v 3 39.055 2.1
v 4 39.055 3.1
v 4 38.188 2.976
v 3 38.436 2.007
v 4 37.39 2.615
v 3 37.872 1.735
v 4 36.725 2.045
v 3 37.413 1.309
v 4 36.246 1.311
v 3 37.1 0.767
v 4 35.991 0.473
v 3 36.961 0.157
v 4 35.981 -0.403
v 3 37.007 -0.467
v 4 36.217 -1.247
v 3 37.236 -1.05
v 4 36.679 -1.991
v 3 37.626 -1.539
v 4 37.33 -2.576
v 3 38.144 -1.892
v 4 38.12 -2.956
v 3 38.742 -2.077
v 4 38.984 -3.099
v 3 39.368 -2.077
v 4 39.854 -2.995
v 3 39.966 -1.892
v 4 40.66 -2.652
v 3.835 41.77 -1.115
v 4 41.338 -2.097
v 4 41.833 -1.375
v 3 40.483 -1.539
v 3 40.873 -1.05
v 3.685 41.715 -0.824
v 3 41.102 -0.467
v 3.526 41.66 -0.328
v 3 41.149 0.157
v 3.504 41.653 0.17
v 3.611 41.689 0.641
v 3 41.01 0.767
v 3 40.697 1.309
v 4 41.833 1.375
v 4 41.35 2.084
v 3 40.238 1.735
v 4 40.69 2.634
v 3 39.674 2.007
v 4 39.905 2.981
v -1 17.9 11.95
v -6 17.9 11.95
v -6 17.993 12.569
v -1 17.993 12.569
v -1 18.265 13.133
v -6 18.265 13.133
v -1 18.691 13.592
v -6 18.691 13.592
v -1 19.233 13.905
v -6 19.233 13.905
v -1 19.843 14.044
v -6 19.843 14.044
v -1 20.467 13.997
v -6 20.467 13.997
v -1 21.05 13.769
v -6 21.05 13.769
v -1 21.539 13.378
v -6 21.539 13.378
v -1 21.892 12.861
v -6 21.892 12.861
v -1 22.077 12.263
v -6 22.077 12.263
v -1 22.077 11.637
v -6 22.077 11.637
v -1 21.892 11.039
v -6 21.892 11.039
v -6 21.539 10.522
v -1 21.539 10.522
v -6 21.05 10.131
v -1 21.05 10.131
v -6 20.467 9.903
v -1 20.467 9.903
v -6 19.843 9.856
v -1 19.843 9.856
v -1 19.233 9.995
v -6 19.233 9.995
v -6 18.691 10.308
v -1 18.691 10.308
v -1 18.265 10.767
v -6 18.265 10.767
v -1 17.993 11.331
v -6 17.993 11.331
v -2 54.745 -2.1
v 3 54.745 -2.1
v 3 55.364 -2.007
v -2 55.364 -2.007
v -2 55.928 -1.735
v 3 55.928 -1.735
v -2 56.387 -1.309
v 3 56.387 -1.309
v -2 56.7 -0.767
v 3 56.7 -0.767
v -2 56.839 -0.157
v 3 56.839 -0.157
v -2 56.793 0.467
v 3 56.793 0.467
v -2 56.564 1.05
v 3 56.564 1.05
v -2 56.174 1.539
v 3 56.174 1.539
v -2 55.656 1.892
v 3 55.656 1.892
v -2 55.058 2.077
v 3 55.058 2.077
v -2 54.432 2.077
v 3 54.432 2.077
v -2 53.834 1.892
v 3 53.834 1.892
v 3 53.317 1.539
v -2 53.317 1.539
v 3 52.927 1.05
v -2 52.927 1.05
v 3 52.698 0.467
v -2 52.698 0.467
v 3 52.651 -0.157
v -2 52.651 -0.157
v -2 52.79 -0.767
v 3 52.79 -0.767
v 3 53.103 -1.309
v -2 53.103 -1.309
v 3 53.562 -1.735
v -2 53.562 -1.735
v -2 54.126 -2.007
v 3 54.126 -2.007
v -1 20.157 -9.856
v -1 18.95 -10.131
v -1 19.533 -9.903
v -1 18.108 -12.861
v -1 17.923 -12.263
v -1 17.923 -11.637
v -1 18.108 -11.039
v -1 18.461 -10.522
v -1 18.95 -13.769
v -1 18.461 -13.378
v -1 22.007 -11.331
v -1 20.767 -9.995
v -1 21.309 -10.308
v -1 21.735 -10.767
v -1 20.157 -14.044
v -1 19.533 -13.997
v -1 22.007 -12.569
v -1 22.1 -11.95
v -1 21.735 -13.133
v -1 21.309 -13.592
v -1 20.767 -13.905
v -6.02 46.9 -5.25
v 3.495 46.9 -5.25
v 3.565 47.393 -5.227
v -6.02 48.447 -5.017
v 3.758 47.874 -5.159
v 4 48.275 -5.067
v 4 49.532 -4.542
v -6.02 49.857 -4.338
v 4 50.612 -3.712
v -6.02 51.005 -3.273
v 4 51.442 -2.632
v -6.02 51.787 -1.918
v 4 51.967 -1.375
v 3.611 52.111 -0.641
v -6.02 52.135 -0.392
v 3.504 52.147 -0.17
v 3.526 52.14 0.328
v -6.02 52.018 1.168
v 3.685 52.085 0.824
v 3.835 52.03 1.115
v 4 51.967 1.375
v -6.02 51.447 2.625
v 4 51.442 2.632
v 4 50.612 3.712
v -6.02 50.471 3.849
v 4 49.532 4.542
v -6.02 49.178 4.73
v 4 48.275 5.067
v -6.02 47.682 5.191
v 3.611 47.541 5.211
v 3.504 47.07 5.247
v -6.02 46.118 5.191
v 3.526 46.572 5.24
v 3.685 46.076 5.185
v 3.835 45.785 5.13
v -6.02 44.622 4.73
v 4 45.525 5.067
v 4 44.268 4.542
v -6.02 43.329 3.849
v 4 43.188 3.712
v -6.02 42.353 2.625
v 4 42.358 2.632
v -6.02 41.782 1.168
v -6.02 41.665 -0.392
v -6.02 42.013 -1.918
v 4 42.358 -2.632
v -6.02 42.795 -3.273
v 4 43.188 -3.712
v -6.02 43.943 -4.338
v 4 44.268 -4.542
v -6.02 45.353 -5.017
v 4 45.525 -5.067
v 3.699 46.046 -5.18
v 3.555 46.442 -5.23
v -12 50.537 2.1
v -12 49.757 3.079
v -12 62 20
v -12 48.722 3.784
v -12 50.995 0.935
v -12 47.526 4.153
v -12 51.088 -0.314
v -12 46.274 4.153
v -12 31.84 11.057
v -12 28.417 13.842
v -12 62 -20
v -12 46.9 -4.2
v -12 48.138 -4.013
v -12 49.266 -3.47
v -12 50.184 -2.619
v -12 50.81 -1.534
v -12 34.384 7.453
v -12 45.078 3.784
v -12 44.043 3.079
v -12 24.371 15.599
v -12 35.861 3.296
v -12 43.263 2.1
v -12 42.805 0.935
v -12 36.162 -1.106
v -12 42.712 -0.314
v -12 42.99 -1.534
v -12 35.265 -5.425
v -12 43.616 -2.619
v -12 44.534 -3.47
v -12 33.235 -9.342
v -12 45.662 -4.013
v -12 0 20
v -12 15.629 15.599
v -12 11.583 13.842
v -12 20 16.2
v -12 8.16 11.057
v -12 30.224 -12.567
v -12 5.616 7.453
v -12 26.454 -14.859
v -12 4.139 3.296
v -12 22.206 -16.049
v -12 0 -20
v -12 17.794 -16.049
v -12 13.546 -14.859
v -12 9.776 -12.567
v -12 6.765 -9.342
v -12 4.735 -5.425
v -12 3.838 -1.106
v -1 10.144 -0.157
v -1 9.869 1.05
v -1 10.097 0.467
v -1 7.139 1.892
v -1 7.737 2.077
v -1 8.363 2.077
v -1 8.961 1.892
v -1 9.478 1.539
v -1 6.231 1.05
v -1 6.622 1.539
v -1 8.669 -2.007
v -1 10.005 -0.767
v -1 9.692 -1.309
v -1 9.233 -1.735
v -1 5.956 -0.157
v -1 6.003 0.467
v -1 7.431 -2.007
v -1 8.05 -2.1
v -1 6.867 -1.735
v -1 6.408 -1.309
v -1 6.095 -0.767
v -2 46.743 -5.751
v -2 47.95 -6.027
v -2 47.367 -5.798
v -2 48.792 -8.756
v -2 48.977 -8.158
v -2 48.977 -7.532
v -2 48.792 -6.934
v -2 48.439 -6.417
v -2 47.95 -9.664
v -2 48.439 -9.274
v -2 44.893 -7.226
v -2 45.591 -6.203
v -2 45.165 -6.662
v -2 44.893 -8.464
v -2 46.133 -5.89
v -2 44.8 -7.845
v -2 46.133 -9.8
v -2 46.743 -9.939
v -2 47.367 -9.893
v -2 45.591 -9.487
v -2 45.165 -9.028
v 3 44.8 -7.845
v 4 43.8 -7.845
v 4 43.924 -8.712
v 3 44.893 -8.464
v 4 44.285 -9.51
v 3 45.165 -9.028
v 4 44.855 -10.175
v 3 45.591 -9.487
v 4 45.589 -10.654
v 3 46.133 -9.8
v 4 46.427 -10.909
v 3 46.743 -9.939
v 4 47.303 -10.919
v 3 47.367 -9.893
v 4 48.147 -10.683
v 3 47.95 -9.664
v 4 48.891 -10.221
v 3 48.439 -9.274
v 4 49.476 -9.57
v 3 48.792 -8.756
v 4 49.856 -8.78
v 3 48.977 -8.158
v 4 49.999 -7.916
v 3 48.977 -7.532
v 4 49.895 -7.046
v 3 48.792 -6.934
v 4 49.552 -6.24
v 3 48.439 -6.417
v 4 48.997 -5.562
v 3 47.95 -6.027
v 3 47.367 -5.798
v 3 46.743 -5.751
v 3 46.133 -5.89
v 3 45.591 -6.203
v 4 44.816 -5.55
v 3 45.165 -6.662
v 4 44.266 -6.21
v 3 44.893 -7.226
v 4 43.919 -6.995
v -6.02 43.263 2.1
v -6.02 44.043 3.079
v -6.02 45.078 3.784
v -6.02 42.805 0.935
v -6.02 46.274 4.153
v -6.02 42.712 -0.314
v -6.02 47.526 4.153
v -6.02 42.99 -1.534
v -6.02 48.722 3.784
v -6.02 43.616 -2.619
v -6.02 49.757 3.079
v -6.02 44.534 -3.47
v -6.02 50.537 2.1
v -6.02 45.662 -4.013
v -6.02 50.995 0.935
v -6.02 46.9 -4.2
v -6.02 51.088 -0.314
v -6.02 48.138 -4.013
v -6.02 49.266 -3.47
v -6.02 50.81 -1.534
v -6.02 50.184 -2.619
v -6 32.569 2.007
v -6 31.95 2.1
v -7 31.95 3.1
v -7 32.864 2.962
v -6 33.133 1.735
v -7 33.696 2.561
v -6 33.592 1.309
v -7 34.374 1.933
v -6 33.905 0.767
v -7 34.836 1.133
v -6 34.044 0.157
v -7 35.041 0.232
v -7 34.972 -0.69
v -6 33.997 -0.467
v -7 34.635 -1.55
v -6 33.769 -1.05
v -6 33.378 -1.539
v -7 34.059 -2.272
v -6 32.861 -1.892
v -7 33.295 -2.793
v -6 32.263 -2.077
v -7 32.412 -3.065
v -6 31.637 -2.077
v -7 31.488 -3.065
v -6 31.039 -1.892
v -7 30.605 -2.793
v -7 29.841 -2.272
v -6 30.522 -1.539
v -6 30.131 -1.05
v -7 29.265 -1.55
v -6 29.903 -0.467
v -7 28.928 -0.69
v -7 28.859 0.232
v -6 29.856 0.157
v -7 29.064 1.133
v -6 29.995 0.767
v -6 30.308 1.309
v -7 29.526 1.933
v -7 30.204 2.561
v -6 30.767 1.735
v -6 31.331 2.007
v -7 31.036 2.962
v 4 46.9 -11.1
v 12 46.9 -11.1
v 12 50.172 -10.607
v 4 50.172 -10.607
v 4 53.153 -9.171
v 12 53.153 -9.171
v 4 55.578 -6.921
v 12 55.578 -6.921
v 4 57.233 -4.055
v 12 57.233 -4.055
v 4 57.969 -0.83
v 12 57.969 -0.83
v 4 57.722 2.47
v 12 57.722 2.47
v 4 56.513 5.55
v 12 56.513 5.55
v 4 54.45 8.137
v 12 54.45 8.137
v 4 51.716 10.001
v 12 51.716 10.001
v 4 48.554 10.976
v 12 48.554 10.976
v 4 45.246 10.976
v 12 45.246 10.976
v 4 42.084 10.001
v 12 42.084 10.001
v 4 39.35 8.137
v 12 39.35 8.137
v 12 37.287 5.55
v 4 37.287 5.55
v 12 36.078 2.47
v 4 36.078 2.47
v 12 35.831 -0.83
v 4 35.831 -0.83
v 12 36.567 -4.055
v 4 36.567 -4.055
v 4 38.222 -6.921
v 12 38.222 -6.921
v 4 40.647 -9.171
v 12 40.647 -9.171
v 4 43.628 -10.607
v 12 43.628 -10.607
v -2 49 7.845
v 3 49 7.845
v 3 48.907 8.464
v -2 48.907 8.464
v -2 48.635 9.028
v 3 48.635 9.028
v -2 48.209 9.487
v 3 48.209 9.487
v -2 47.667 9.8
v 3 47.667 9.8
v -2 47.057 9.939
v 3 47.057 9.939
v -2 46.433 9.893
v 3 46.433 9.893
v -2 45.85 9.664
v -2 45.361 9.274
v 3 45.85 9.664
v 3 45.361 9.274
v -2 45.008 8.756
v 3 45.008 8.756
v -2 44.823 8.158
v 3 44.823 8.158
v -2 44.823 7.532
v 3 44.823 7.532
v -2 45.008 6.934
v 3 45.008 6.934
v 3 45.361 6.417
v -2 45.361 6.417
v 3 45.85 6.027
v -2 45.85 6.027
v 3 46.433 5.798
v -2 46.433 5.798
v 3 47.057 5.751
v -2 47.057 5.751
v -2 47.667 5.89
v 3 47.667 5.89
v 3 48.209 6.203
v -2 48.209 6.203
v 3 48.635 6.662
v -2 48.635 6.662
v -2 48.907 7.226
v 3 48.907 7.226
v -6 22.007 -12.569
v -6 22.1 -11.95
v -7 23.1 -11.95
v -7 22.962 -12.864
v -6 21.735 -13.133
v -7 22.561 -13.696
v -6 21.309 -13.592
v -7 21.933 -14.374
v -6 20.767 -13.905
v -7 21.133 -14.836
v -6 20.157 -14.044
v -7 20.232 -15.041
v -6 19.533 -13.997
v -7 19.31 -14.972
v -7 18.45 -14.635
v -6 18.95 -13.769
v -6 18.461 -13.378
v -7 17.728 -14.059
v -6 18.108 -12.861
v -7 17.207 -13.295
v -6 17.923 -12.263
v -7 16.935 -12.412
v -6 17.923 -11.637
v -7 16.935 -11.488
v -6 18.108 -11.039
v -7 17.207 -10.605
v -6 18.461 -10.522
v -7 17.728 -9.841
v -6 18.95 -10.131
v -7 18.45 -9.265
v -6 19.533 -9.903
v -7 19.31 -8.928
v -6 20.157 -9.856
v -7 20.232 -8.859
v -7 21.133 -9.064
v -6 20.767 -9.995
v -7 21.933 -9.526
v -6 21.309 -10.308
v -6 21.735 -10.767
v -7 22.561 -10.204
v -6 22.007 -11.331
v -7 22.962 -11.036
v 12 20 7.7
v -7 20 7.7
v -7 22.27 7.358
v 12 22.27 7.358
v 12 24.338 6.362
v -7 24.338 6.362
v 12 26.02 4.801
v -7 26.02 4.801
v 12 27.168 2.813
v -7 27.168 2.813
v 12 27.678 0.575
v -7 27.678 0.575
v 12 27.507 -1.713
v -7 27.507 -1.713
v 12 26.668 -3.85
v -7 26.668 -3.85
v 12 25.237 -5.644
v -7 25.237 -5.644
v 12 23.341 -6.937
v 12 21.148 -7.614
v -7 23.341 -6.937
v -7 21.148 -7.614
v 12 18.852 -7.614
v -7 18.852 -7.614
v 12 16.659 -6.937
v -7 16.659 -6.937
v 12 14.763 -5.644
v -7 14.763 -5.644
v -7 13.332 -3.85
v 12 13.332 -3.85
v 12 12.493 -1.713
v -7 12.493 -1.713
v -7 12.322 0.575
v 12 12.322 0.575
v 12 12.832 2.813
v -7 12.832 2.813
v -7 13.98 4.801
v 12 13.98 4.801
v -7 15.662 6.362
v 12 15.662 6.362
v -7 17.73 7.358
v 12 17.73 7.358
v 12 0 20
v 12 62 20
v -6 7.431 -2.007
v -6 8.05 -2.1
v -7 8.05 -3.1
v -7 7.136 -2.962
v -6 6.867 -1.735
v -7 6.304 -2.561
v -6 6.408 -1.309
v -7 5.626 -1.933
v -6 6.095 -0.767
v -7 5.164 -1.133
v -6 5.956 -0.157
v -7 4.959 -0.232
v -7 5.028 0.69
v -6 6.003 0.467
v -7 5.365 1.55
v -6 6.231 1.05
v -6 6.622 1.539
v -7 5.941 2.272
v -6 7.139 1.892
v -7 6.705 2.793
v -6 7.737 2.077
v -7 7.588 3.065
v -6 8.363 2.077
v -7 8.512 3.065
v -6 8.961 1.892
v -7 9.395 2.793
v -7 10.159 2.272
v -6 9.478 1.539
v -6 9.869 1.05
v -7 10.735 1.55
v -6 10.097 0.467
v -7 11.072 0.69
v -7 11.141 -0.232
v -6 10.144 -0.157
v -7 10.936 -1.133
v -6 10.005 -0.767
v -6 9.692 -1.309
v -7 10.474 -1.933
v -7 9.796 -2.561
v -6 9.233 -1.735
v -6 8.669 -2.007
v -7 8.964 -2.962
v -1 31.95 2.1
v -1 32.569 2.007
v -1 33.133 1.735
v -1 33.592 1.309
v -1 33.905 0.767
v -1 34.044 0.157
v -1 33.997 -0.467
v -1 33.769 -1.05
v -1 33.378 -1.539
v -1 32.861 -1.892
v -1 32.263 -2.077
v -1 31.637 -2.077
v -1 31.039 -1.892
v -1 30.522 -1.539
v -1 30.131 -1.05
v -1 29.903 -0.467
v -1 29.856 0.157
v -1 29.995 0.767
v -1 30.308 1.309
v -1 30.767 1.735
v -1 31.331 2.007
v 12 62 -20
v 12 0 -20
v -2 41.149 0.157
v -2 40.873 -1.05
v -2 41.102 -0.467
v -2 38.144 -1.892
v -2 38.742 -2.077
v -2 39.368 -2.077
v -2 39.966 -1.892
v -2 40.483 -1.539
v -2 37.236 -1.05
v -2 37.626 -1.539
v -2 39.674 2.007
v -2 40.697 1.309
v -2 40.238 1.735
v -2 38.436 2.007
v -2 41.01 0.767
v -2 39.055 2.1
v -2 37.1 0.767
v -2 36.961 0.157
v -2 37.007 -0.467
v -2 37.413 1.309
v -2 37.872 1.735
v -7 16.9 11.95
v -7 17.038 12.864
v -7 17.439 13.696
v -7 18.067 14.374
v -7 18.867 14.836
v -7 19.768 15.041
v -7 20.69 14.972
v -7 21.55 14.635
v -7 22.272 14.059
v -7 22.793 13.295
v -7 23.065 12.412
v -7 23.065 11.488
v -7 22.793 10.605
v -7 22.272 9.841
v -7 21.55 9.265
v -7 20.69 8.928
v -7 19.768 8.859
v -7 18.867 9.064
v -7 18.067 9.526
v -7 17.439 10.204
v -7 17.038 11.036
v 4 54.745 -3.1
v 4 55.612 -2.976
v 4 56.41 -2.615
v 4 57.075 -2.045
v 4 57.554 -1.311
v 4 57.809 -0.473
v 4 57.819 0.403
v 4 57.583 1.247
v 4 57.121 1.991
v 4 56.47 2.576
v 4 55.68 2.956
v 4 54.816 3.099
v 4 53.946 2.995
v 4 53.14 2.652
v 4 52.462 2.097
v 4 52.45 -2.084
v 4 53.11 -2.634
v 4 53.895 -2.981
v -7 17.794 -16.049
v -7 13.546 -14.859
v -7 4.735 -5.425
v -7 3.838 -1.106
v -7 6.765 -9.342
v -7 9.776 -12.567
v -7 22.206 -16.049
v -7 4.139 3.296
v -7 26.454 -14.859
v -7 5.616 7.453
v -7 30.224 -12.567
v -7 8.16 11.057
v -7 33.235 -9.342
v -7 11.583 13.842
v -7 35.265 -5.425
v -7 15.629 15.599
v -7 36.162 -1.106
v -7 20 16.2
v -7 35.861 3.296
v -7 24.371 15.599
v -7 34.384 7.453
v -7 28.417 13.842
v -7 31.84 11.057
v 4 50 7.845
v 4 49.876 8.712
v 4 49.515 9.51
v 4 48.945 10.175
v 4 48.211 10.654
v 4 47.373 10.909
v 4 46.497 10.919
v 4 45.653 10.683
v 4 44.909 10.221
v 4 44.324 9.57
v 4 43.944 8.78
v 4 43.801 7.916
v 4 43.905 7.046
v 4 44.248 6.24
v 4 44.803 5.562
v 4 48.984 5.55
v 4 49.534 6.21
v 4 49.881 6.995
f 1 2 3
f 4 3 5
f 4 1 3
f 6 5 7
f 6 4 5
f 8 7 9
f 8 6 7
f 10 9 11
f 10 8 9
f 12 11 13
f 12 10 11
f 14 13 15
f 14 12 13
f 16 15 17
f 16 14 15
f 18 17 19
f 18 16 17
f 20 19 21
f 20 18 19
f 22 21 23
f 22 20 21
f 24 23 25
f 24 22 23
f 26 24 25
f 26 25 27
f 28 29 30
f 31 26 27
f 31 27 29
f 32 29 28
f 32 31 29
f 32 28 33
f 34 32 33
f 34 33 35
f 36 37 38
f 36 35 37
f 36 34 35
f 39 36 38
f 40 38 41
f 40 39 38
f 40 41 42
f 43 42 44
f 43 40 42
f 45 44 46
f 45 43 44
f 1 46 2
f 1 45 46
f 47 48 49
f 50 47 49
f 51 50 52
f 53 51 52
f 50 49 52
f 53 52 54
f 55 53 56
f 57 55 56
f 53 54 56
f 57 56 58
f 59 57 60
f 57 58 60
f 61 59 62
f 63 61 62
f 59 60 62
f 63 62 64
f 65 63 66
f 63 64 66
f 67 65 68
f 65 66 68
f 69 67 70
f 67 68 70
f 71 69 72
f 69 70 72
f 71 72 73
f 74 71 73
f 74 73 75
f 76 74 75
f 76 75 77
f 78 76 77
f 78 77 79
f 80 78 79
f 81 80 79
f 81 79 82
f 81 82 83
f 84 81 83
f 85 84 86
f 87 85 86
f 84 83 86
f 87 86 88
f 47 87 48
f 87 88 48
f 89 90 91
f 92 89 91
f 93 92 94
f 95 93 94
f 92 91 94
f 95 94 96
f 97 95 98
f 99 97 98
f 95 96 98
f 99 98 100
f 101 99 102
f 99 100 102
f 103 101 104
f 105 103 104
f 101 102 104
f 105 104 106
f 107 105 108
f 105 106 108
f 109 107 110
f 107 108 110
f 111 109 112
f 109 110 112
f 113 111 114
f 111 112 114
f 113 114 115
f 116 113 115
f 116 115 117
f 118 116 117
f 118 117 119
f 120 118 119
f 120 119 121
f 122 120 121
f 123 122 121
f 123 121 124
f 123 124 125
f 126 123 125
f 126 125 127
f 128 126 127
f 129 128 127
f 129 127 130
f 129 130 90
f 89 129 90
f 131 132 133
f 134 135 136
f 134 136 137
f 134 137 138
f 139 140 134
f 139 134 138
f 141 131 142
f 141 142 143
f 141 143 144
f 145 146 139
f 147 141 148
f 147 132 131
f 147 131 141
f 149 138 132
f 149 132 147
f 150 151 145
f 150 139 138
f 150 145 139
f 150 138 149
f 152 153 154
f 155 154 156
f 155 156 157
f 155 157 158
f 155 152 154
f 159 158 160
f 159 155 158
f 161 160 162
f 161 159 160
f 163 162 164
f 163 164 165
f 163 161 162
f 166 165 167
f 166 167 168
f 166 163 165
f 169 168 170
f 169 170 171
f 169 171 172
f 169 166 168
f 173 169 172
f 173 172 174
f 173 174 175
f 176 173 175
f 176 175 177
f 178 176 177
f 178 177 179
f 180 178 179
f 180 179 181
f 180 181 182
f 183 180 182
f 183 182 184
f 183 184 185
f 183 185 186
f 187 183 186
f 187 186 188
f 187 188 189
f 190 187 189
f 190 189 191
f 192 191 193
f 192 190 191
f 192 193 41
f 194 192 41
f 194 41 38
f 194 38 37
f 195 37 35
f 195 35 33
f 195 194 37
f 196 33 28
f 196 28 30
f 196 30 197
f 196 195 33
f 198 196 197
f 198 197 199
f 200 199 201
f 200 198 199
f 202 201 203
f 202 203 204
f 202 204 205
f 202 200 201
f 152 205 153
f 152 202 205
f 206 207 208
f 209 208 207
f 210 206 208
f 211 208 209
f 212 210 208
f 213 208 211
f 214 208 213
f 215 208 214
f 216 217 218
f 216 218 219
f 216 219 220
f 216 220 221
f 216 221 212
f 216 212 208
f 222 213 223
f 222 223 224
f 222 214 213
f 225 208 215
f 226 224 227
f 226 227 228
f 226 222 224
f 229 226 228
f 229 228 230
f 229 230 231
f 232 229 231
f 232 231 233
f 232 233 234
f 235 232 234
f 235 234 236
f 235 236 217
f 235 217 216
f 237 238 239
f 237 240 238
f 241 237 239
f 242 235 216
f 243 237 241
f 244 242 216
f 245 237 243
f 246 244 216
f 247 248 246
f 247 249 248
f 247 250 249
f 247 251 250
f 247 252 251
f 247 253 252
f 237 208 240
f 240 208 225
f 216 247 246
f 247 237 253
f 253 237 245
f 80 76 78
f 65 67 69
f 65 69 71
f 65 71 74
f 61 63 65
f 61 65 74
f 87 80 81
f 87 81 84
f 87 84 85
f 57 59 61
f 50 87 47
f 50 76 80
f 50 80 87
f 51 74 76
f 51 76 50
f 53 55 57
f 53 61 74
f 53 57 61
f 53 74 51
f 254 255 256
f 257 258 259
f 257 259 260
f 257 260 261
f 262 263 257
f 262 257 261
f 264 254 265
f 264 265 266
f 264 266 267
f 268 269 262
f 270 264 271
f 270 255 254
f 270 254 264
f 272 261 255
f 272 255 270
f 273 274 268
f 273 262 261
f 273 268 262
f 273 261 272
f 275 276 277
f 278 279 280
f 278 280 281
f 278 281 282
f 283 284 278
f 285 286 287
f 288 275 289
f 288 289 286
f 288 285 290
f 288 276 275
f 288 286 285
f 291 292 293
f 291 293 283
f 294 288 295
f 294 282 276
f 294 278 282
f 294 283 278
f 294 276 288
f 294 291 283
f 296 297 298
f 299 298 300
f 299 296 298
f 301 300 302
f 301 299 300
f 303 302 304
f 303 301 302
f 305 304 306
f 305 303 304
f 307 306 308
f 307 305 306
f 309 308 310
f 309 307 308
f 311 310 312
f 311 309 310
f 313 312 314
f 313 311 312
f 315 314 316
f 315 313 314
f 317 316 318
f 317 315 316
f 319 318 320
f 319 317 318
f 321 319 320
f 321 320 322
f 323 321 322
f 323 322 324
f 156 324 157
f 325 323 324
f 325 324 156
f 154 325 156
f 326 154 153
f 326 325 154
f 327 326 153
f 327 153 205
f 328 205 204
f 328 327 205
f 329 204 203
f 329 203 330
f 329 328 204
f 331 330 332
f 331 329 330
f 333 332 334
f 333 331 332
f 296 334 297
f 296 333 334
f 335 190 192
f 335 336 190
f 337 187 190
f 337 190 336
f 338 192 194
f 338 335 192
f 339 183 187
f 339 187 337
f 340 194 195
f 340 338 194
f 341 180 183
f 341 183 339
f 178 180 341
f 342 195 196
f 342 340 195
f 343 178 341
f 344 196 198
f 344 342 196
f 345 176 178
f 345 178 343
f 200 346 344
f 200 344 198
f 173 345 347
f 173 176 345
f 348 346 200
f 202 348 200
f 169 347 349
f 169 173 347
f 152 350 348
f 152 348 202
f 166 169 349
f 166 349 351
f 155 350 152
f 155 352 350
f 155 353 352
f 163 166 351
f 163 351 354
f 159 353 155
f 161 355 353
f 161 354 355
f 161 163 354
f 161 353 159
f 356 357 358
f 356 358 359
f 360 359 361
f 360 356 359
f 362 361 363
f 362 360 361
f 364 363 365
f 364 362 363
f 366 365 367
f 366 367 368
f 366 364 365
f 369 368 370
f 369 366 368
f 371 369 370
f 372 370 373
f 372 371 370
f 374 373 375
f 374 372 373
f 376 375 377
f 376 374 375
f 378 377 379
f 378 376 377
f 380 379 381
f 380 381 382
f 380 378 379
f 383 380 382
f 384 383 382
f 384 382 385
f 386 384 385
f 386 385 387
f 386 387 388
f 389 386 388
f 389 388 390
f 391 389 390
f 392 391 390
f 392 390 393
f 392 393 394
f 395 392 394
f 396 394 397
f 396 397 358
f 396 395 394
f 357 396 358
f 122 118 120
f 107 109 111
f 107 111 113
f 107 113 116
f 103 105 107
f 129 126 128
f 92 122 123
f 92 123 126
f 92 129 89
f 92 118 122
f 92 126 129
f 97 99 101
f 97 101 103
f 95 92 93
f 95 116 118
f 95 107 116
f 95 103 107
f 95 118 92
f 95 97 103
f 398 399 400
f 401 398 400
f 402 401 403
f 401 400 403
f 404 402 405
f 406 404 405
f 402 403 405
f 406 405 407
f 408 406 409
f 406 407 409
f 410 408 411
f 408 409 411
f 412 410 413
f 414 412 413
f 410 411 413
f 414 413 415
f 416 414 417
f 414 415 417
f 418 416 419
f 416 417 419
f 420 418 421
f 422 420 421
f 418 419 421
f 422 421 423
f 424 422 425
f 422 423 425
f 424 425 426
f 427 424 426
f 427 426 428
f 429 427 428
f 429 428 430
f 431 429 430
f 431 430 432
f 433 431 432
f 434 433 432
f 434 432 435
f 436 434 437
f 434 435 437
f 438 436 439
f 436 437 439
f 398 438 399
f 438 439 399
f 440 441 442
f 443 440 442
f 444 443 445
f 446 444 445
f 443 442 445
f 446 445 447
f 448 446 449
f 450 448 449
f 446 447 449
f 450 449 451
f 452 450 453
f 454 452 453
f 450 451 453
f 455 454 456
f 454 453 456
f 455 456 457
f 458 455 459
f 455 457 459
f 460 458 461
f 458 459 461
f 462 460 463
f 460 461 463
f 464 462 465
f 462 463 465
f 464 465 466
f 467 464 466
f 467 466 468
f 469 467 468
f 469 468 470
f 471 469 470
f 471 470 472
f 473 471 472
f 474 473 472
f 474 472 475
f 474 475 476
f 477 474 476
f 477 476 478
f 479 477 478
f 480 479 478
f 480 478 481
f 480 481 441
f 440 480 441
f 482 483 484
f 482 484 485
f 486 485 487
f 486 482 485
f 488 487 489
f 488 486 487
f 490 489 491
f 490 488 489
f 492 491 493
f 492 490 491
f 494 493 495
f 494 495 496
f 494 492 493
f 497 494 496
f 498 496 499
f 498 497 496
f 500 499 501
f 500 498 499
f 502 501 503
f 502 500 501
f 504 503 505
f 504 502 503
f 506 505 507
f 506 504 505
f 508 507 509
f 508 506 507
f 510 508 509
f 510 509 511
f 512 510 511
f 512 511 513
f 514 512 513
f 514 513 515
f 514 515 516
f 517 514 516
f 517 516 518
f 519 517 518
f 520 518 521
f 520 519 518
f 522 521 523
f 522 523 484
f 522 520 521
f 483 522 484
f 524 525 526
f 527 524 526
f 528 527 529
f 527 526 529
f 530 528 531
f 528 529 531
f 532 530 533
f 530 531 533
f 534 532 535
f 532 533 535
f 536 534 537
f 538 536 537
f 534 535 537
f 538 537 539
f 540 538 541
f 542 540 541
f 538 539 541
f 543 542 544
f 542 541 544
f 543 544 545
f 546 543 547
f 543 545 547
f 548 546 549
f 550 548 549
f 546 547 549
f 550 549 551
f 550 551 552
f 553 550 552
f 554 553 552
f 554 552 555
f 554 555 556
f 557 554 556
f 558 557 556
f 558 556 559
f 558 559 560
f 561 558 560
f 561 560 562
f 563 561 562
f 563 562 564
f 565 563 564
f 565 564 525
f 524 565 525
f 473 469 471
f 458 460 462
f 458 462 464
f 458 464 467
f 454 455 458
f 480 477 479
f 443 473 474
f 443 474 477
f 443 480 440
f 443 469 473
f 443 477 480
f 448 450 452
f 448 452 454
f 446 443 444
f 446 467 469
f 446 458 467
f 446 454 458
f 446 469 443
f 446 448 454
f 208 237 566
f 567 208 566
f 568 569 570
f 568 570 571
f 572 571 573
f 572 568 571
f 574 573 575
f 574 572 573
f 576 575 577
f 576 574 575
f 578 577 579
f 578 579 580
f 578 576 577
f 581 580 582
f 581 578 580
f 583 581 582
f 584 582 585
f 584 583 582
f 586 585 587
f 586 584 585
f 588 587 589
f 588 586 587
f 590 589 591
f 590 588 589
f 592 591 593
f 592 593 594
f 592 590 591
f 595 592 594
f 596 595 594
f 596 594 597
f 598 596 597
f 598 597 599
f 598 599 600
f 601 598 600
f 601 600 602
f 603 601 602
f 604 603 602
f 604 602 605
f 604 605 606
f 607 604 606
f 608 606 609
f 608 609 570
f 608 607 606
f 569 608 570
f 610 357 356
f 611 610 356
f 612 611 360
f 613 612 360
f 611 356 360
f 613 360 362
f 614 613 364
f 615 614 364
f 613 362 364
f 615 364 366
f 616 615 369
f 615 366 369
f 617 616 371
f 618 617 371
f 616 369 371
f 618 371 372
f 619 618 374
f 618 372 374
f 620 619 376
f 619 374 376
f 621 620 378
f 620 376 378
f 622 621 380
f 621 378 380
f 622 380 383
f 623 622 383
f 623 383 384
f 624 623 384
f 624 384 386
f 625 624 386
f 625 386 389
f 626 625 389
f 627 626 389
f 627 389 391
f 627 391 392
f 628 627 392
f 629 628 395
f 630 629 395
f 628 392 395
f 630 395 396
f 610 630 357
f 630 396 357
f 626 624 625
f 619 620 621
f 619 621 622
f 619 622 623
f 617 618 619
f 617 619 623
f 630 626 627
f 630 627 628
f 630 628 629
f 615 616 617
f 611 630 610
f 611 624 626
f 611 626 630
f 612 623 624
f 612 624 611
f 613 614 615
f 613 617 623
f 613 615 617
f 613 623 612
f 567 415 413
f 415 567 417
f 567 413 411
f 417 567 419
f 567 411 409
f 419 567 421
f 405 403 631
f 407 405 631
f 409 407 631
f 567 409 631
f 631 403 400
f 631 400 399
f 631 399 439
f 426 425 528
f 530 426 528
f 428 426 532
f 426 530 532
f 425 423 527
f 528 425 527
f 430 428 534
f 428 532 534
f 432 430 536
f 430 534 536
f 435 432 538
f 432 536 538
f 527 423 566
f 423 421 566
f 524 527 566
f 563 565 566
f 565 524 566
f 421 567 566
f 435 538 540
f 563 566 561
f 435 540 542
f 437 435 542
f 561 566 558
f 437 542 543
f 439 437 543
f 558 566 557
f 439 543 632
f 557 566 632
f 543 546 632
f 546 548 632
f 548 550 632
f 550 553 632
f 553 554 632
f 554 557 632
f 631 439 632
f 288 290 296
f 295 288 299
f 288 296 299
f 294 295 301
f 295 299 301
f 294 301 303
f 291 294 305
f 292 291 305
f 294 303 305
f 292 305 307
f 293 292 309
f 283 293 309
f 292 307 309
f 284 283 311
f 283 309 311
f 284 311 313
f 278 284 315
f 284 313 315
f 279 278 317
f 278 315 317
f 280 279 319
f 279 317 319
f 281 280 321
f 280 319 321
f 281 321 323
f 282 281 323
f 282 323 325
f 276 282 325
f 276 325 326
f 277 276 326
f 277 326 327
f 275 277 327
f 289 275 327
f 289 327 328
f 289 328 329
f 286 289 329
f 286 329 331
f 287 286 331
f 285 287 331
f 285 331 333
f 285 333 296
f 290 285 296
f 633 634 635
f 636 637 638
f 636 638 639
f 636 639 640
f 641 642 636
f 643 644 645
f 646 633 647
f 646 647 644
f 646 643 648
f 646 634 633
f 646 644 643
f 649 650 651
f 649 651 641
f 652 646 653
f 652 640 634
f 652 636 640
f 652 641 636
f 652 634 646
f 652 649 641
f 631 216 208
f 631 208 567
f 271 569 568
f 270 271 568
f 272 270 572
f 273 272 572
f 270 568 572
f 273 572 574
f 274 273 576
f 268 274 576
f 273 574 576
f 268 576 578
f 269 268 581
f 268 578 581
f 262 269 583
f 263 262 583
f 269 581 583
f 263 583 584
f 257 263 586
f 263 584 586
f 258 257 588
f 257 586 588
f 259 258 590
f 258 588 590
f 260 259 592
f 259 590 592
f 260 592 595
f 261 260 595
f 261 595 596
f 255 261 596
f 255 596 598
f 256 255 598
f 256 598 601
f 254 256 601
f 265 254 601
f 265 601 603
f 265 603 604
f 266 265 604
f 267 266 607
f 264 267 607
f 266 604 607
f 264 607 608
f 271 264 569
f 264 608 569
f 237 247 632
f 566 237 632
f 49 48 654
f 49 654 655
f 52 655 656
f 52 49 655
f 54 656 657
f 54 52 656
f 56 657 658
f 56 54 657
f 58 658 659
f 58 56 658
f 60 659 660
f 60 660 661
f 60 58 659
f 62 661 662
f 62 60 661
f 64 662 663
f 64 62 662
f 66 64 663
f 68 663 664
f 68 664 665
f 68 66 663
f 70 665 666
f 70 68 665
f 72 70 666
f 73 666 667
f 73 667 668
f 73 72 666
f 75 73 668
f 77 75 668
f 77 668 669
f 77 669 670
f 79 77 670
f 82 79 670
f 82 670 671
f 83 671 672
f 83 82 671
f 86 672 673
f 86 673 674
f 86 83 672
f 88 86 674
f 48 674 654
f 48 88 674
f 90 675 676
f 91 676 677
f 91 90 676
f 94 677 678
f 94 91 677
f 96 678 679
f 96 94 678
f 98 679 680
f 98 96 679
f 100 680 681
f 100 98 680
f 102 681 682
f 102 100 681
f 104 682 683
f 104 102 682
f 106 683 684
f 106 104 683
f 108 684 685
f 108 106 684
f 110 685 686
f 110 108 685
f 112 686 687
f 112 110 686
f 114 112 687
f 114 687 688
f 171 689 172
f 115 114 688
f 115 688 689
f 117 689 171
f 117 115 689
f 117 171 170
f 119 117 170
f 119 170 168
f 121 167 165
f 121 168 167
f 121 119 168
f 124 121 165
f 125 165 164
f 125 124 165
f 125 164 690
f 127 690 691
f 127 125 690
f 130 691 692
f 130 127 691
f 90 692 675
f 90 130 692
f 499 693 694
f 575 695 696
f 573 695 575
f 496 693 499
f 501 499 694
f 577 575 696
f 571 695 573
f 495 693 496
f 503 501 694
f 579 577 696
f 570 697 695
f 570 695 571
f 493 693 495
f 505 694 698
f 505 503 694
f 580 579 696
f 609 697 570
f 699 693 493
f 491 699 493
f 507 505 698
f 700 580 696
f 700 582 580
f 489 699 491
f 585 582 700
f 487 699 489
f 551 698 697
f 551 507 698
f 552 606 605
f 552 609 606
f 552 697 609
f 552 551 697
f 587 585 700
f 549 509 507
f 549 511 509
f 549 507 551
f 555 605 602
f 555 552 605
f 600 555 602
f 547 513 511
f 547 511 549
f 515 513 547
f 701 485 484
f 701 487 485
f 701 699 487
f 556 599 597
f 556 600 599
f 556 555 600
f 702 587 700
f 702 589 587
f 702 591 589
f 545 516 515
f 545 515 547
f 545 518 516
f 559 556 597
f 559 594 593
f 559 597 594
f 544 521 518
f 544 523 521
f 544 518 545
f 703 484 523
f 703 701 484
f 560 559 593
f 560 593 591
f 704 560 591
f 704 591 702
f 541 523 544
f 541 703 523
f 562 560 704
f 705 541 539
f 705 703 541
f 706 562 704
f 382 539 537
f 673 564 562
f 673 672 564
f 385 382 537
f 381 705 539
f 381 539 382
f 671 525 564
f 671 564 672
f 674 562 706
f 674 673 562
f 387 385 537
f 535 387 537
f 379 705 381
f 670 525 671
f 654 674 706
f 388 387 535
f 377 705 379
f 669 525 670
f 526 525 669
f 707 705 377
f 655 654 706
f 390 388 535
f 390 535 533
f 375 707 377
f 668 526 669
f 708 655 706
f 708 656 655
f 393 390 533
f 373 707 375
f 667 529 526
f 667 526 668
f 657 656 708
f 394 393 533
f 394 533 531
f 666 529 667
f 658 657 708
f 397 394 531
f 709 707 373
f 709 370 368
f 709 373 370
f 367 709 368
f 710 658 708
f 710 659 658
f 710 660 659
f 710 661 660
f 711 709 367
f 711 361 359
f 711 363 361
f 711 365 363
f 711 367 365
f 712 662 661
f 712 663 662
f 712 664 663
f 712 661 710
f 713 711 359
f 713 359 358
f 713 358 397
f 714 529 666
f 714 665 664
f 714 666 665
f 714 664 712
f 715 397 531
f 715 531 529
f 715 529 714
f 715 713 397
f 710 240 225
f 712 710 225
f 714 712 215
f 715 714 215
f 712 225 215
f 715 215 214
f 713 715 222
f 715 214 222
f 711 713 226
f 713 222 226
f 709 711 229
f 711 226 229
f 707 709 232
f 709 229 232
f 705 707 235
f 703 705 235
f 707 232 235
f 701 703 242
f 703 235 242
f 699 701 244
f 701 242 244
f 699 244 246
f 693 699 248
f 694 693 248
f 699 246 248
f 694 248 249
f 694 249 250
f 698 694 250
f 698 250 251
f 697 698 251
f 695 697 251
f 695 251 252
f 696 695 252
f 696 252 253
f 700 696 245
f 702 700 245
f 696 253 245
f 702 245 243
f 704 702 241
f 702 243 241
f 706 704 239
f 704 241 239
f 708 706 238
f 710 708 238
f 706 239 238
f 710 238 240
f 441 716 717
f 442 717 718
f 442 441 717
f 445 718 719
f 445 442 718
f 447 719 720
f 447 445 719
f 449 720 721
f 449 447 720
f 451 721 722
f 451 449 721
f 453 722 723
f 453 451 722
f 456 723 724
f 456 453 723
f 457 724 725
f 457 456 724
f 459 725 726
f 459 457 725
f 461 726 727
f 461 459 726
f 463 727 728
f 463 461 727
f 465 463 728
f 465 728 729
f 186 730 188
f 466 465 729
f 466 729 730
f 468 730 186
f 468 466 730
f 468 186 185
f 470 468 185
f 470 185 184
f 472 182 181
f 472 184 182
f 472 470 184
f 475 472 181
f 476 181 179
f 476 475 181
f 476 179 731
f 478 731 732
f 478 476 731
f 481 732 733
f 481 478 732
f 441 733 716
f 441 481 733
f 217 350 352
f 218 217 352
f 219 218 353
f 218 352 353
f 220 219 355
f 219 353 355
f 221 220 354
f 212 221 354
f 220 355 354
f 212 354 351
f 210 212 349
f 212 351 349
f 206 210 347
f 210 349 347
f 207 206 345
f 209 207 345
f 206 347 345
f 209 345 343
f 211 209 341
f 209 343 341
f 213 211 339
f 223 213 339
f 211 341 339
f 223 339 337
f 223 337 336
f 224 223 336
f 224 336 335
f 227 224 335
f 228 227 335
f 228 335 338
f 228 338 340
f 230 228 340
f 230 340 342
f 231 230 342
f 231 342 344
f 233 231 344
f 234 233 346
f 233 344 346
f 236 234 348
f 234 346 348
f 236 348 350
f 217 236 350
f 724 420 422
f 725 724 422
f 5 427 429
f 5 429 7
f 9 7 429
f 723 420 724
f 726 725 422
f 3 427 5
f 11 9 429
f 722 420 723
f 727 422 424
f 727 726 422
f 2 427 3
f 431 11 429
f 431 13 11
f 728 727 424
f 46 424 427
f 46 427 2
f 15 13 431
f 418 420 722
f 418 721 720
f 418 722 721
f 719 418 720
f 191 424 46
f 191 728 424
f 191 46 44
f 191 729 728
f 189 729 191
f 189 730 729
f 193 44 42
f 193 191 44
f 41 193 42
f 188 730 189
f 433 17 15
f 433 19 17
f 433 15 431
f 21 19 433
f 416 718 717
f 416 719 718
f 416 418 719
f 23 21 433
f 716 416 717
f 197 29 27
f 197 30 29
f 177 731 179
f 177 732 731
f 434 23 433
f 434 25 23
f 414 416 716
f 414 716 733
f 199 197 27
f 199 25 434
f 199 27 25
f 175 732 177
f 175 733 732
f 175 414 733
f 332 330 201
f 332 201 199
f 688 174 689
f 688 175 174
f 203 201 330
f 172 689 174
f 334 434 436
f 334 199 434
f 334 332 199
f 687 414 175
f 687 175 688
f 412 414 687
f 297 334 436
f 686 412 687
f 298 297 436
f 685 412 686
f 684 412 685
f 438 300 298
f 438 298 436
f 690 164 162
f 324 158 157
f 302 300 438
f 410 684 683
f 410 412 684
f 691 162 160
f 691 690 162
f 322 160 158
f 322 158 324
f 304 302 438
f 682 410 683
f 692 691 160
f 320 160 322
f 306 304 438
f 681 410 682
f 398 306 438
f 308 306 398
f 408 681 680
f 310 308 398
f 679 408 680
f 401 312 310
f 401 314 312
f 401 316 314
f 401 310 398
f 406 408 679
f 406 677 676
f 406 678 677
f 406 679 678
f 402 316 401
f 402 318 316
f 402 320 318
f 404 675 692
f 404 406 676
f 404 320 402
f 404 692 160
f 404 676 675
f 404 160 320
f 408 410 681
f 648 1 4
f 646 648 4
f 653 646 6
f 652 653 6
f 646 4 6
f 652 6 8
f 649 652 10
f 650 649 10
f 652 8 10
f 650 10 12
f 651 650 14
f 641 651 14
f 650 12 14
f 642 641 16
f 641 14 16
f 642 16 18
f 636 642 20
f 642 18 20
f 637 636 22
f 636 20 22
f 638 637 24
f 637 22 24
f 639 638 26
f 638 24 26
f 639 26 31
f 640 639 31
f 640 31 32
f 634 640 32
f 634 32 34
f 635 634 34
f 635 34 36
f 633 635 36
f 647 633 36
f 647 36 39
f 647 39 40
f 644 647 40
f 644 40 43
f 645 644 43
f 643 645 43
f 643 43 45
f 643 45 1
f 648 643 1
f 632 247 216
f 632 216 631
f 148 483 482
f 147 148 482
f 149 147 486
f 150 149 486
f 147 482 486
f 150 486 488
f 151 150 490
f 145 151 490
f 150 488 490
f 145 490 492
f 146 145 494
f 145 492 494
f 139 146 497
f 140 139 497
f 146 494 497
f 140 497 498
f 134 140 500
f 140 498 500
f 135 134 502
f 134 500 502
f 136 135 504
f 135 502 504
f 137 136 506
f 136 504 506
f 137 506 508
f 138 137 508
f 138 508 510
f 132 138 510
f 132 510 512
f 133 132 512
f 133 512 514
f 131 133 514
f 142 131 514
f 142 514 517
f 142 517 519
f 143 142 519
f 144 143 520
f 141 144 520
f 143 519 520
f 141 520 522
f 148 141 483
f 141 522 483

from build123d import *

# Parameters (mm, degrees)
SKETCH1_W                    = 24
SKETCH1_H                    = 40
BOSS_EXTRUDE1_DEPTH          = 62
SKETCH2_R                    = 16.2
CUT_EXTRUDE1_DEPTH           = 5
SKETCH3_R                    = 7.7
CUT_EXTRUDE2_DEPTH           = 25
SKETCH4_R                    = 2.1
CUT_EXTRUDE3_DEPTH           = 6
CHAMFER1_SIZE                = 1
CIRPATTERN1_COUNT            = 4
CHAMFER1_OF_CIRPATTERN1_SIZE = 1
SKETCH5_R                    = 11.1
CUT_EXTRUDE4_DEPTH           = 8
CUT_EXTRUDE5_START           = -10.02
SKETCH6_R                    = 5.25
CUT_EXTRUDE5_DEPTH           = 10.02
SKETCH7_R                    = 4.2
CUT_EXTRUDE6_DEPTH           = 5.98
SKETCH8_R                    = 2.1
CUT_EXTRUDE7_DEPTH           = 6
CHAMFER2_SIZE                = 1
CIRPATTERN2_COUNT            = 4
CHAMFER2_OF_CIRPATTERN2_SIZE = 1


with BuildPart() as part:
    # Sketch1 → Boss-Extrude1 (new body)
    with BuildSketch(Plane(origin=(0, 0, 0), x_dir=(1, 0, 0), z_dir=(0, 1, 0))):
        Rectangle(SKETCH1_W, SKETCH1_H)
    extrude(amount=BOSS_EXTRUDE1_DEPTH)

    # Sketch2 → Cut-Extrude1 (cut)
    with BuildSketch(Plane.ZY.offset(12)):
        with Locations((0, 20)):
            Circle(SKETCH2_R)
    extrude(amount=-CUT_EXTRUDE1_DEPTH, mode=Mode.SUBTRACT)

    # Sketch3 → Cut-Extrude2 (cut)
    with BuildSketch(Plane.ZY.offset(7)):
        with Locations((0, 20)):
            Circle(SKETCH3_R)
    extrude(amount=-CUT_EXTRUDE2_DEPTH, mode=Mode.SUBTRACT)

    # Sketch4 → Cut-Extrude3 (cut)
    with BuildSketch(Plane.ZY.offset(7)):
        with Locations((0, 31.95)):
            Circle(SKETCH4_R)
    cut_extrude3 = extrude(amount=-CUT_EXTRUDE3_DEPTH, mode=Mode.SUBTRACT)

    # Chamfer1
    chamfer1_edges = [part.edges().sort_by_distance(p)[0] for p in [
        (-7, 31.95, -2.1),
    ]]
    chamfer(chamfer1_edges, length=CHAMFER1_SIZE)

    # CirPattern1: Cut-Extrude3 ×4 about axis
    cirpattern1_axis = Axis((0, 20, 0), (1, 0, 0))
    for i in range(1, CIRPATTERN1_COUNT):
        add(cut_extrude3.rotate(cirpattern1_axis, i * 360 / CIRPATTERN1_COUNT), mode=Mode.SUBTRACT)

    # Chamfer1 of CirPattern1
    chamfer1_of_cirpattern1_edges = [part.edges().sort_by_distance(p)[0] for p in [
        (-7, 22.1, 11.95),
        (-7, 8.05, 2.1),
        (-7, 17.9, -11.95),
    ]]
    chamfer(chamfer1_of_cirpattern1_edges, length=CHAMFER1_OF_CIRPATTERN1_SIZE)

    # Sketch5 → Cut-Extrude4 (cut)
    with BuildSketch(Plane(origin=(12, 0, 0), x_dir=(0, 0, -1), z_dir=(1, 0, 0))):
        with Locations((0, 46.9)):
            Circle(SKETCH5_R)
    extrude(amount=-CUT_EXTRUDE4_DEPTH, mode=Mode.SUBTRACT)

    # Sketch6 → Cut-Extrude5 (cut)
    with BuildSketch(Plane(origin=(4, 0, 0), x_dir=(0, 0, -1), z_dir=(1, 0, 0)).offset(CUT_EXTRUDE5_START)):
        with Locations((0, 46.9)):
            Circle(SKETCH6_R)
    extrude(amount=CUT_EXTRUDE5_DEPTH, mode=Mode.SUBTRACT)

    # Sketch7 → Cut-Extrude6 (cut)
    with BuildSketch(Plane(origin=(-6.02, 0, 0), x_dir=(0, 0, -1), z_dir=(1, 0, 0))):
        with Locations((0, 46.9)):
            Circle(SKETCH7_R)
    extrude(amount=-CUT_EXTRUDE6_DEPTH, mode=Mode.SUBTRACT)

    # Sketch8 → Cut-Extrude7 (cut)
    with BuildSketch(Plane(origin=(4, 0, 0), x_dir=(0, 0, -1), z_dir=(1, 0, 0))):
        with Locations((0, 54.74525)):
            Circle(SKETCH8_R)
    cut_extrude7 = extrude(amount=-CUT_EXTRUDE7_DEPTH, mode=Mode.SUBTRACT)

    # Chamfer2
    # the kernel refuses this chamfer: 1 mm, written as the material it takes off along each edge
    with BuildSketch(Plane(origin=(4, 54.74525, 0), x_dir=(0, 0, -1), z_dir=(0, -1, 0))) as chamfer2_piece_1:
        Polygon((2.1 + CHAMFER2_SIZE, 0), (2.1, -CHAMFER2_SIZE), (2.1, 0), align=None)
    revolve(axis=Axis((4, 54.74525, 0), (1, 0, 0)), mode=Mode.SUBTRACT)

    # CirPattern2: Cut-Extrude7 ×4 about axis
    cirpattern2_axis = Axis((0, 46.9, 0), (1, 0, 0))
    for i in range(1, CIRPATTERN2_COUNT):
        add(cut_extrude7.rotate(cirpattern2_axis, i * 360 / CIRPATTERN2_COUNT), mode=Mode.SUBTRACT)

    # Chamfer2 of CirPattern2
    # the kernel refuses this chamfer: 1 mm, written as the material it takes off along each edge
    with BuildSketch(Plane(origin=(4, 46.9, 7.84525), x_dir=(0, 1, 0), z_dir=(0, 0, -1))) as chamfer2_of_cirpattern2_piece_1:
        Polygon((2.1 + CHAMFER2_OF_CIRPATTERN2_SIZE, 0), (2.1, -CHAMFER2_OF_CIRPATTERN2_SIZE), (2.1, 0), align=None)
    revolve(axis=Axis((4, 46.9, 7.84525), (1, 0, 0)), mode=Mode.SUBTRACT)
    with BuildSketch(Plane(origin=(4, 39.05475, 0), x_dir=(0, 0, 1), z_dir=(0, 1, 0))) as chamfer2_of_cirpattern2_piece_2:
        Polygon((2.1 + CHAMFER2_OF_CIRPATTERN2_SIZE, 0), (2.1, -CHAMFER2_OF_CIRPATTERN2_SIZE), (2.1, 0), align=None)
    revolve(axis=Axis((4, 39.05475, 0), (1, 0, 0)), mode=Mode.SUBTRACT)
    with BuildSketch(Plane(origin=(4, 46.9, -7.84525), x_dir=(0, -1, 0), z_dir=(0, 0, 1))) as chamfer2_of_cirpattern2_piece_3:
        Polygon((2.1 + CHAMFER2_OF_CIRPATTERN2_SIZE, 0), (2.1, -CHAMFER2_OF_CIRPATTERN2_SIZE), (2.1, 0), align=None)
    revolve(axis=Axis((4, 46.9, -7.84525), (1, 0, 0)), mode=Mode.SUBTRACT)


solid = part.part
